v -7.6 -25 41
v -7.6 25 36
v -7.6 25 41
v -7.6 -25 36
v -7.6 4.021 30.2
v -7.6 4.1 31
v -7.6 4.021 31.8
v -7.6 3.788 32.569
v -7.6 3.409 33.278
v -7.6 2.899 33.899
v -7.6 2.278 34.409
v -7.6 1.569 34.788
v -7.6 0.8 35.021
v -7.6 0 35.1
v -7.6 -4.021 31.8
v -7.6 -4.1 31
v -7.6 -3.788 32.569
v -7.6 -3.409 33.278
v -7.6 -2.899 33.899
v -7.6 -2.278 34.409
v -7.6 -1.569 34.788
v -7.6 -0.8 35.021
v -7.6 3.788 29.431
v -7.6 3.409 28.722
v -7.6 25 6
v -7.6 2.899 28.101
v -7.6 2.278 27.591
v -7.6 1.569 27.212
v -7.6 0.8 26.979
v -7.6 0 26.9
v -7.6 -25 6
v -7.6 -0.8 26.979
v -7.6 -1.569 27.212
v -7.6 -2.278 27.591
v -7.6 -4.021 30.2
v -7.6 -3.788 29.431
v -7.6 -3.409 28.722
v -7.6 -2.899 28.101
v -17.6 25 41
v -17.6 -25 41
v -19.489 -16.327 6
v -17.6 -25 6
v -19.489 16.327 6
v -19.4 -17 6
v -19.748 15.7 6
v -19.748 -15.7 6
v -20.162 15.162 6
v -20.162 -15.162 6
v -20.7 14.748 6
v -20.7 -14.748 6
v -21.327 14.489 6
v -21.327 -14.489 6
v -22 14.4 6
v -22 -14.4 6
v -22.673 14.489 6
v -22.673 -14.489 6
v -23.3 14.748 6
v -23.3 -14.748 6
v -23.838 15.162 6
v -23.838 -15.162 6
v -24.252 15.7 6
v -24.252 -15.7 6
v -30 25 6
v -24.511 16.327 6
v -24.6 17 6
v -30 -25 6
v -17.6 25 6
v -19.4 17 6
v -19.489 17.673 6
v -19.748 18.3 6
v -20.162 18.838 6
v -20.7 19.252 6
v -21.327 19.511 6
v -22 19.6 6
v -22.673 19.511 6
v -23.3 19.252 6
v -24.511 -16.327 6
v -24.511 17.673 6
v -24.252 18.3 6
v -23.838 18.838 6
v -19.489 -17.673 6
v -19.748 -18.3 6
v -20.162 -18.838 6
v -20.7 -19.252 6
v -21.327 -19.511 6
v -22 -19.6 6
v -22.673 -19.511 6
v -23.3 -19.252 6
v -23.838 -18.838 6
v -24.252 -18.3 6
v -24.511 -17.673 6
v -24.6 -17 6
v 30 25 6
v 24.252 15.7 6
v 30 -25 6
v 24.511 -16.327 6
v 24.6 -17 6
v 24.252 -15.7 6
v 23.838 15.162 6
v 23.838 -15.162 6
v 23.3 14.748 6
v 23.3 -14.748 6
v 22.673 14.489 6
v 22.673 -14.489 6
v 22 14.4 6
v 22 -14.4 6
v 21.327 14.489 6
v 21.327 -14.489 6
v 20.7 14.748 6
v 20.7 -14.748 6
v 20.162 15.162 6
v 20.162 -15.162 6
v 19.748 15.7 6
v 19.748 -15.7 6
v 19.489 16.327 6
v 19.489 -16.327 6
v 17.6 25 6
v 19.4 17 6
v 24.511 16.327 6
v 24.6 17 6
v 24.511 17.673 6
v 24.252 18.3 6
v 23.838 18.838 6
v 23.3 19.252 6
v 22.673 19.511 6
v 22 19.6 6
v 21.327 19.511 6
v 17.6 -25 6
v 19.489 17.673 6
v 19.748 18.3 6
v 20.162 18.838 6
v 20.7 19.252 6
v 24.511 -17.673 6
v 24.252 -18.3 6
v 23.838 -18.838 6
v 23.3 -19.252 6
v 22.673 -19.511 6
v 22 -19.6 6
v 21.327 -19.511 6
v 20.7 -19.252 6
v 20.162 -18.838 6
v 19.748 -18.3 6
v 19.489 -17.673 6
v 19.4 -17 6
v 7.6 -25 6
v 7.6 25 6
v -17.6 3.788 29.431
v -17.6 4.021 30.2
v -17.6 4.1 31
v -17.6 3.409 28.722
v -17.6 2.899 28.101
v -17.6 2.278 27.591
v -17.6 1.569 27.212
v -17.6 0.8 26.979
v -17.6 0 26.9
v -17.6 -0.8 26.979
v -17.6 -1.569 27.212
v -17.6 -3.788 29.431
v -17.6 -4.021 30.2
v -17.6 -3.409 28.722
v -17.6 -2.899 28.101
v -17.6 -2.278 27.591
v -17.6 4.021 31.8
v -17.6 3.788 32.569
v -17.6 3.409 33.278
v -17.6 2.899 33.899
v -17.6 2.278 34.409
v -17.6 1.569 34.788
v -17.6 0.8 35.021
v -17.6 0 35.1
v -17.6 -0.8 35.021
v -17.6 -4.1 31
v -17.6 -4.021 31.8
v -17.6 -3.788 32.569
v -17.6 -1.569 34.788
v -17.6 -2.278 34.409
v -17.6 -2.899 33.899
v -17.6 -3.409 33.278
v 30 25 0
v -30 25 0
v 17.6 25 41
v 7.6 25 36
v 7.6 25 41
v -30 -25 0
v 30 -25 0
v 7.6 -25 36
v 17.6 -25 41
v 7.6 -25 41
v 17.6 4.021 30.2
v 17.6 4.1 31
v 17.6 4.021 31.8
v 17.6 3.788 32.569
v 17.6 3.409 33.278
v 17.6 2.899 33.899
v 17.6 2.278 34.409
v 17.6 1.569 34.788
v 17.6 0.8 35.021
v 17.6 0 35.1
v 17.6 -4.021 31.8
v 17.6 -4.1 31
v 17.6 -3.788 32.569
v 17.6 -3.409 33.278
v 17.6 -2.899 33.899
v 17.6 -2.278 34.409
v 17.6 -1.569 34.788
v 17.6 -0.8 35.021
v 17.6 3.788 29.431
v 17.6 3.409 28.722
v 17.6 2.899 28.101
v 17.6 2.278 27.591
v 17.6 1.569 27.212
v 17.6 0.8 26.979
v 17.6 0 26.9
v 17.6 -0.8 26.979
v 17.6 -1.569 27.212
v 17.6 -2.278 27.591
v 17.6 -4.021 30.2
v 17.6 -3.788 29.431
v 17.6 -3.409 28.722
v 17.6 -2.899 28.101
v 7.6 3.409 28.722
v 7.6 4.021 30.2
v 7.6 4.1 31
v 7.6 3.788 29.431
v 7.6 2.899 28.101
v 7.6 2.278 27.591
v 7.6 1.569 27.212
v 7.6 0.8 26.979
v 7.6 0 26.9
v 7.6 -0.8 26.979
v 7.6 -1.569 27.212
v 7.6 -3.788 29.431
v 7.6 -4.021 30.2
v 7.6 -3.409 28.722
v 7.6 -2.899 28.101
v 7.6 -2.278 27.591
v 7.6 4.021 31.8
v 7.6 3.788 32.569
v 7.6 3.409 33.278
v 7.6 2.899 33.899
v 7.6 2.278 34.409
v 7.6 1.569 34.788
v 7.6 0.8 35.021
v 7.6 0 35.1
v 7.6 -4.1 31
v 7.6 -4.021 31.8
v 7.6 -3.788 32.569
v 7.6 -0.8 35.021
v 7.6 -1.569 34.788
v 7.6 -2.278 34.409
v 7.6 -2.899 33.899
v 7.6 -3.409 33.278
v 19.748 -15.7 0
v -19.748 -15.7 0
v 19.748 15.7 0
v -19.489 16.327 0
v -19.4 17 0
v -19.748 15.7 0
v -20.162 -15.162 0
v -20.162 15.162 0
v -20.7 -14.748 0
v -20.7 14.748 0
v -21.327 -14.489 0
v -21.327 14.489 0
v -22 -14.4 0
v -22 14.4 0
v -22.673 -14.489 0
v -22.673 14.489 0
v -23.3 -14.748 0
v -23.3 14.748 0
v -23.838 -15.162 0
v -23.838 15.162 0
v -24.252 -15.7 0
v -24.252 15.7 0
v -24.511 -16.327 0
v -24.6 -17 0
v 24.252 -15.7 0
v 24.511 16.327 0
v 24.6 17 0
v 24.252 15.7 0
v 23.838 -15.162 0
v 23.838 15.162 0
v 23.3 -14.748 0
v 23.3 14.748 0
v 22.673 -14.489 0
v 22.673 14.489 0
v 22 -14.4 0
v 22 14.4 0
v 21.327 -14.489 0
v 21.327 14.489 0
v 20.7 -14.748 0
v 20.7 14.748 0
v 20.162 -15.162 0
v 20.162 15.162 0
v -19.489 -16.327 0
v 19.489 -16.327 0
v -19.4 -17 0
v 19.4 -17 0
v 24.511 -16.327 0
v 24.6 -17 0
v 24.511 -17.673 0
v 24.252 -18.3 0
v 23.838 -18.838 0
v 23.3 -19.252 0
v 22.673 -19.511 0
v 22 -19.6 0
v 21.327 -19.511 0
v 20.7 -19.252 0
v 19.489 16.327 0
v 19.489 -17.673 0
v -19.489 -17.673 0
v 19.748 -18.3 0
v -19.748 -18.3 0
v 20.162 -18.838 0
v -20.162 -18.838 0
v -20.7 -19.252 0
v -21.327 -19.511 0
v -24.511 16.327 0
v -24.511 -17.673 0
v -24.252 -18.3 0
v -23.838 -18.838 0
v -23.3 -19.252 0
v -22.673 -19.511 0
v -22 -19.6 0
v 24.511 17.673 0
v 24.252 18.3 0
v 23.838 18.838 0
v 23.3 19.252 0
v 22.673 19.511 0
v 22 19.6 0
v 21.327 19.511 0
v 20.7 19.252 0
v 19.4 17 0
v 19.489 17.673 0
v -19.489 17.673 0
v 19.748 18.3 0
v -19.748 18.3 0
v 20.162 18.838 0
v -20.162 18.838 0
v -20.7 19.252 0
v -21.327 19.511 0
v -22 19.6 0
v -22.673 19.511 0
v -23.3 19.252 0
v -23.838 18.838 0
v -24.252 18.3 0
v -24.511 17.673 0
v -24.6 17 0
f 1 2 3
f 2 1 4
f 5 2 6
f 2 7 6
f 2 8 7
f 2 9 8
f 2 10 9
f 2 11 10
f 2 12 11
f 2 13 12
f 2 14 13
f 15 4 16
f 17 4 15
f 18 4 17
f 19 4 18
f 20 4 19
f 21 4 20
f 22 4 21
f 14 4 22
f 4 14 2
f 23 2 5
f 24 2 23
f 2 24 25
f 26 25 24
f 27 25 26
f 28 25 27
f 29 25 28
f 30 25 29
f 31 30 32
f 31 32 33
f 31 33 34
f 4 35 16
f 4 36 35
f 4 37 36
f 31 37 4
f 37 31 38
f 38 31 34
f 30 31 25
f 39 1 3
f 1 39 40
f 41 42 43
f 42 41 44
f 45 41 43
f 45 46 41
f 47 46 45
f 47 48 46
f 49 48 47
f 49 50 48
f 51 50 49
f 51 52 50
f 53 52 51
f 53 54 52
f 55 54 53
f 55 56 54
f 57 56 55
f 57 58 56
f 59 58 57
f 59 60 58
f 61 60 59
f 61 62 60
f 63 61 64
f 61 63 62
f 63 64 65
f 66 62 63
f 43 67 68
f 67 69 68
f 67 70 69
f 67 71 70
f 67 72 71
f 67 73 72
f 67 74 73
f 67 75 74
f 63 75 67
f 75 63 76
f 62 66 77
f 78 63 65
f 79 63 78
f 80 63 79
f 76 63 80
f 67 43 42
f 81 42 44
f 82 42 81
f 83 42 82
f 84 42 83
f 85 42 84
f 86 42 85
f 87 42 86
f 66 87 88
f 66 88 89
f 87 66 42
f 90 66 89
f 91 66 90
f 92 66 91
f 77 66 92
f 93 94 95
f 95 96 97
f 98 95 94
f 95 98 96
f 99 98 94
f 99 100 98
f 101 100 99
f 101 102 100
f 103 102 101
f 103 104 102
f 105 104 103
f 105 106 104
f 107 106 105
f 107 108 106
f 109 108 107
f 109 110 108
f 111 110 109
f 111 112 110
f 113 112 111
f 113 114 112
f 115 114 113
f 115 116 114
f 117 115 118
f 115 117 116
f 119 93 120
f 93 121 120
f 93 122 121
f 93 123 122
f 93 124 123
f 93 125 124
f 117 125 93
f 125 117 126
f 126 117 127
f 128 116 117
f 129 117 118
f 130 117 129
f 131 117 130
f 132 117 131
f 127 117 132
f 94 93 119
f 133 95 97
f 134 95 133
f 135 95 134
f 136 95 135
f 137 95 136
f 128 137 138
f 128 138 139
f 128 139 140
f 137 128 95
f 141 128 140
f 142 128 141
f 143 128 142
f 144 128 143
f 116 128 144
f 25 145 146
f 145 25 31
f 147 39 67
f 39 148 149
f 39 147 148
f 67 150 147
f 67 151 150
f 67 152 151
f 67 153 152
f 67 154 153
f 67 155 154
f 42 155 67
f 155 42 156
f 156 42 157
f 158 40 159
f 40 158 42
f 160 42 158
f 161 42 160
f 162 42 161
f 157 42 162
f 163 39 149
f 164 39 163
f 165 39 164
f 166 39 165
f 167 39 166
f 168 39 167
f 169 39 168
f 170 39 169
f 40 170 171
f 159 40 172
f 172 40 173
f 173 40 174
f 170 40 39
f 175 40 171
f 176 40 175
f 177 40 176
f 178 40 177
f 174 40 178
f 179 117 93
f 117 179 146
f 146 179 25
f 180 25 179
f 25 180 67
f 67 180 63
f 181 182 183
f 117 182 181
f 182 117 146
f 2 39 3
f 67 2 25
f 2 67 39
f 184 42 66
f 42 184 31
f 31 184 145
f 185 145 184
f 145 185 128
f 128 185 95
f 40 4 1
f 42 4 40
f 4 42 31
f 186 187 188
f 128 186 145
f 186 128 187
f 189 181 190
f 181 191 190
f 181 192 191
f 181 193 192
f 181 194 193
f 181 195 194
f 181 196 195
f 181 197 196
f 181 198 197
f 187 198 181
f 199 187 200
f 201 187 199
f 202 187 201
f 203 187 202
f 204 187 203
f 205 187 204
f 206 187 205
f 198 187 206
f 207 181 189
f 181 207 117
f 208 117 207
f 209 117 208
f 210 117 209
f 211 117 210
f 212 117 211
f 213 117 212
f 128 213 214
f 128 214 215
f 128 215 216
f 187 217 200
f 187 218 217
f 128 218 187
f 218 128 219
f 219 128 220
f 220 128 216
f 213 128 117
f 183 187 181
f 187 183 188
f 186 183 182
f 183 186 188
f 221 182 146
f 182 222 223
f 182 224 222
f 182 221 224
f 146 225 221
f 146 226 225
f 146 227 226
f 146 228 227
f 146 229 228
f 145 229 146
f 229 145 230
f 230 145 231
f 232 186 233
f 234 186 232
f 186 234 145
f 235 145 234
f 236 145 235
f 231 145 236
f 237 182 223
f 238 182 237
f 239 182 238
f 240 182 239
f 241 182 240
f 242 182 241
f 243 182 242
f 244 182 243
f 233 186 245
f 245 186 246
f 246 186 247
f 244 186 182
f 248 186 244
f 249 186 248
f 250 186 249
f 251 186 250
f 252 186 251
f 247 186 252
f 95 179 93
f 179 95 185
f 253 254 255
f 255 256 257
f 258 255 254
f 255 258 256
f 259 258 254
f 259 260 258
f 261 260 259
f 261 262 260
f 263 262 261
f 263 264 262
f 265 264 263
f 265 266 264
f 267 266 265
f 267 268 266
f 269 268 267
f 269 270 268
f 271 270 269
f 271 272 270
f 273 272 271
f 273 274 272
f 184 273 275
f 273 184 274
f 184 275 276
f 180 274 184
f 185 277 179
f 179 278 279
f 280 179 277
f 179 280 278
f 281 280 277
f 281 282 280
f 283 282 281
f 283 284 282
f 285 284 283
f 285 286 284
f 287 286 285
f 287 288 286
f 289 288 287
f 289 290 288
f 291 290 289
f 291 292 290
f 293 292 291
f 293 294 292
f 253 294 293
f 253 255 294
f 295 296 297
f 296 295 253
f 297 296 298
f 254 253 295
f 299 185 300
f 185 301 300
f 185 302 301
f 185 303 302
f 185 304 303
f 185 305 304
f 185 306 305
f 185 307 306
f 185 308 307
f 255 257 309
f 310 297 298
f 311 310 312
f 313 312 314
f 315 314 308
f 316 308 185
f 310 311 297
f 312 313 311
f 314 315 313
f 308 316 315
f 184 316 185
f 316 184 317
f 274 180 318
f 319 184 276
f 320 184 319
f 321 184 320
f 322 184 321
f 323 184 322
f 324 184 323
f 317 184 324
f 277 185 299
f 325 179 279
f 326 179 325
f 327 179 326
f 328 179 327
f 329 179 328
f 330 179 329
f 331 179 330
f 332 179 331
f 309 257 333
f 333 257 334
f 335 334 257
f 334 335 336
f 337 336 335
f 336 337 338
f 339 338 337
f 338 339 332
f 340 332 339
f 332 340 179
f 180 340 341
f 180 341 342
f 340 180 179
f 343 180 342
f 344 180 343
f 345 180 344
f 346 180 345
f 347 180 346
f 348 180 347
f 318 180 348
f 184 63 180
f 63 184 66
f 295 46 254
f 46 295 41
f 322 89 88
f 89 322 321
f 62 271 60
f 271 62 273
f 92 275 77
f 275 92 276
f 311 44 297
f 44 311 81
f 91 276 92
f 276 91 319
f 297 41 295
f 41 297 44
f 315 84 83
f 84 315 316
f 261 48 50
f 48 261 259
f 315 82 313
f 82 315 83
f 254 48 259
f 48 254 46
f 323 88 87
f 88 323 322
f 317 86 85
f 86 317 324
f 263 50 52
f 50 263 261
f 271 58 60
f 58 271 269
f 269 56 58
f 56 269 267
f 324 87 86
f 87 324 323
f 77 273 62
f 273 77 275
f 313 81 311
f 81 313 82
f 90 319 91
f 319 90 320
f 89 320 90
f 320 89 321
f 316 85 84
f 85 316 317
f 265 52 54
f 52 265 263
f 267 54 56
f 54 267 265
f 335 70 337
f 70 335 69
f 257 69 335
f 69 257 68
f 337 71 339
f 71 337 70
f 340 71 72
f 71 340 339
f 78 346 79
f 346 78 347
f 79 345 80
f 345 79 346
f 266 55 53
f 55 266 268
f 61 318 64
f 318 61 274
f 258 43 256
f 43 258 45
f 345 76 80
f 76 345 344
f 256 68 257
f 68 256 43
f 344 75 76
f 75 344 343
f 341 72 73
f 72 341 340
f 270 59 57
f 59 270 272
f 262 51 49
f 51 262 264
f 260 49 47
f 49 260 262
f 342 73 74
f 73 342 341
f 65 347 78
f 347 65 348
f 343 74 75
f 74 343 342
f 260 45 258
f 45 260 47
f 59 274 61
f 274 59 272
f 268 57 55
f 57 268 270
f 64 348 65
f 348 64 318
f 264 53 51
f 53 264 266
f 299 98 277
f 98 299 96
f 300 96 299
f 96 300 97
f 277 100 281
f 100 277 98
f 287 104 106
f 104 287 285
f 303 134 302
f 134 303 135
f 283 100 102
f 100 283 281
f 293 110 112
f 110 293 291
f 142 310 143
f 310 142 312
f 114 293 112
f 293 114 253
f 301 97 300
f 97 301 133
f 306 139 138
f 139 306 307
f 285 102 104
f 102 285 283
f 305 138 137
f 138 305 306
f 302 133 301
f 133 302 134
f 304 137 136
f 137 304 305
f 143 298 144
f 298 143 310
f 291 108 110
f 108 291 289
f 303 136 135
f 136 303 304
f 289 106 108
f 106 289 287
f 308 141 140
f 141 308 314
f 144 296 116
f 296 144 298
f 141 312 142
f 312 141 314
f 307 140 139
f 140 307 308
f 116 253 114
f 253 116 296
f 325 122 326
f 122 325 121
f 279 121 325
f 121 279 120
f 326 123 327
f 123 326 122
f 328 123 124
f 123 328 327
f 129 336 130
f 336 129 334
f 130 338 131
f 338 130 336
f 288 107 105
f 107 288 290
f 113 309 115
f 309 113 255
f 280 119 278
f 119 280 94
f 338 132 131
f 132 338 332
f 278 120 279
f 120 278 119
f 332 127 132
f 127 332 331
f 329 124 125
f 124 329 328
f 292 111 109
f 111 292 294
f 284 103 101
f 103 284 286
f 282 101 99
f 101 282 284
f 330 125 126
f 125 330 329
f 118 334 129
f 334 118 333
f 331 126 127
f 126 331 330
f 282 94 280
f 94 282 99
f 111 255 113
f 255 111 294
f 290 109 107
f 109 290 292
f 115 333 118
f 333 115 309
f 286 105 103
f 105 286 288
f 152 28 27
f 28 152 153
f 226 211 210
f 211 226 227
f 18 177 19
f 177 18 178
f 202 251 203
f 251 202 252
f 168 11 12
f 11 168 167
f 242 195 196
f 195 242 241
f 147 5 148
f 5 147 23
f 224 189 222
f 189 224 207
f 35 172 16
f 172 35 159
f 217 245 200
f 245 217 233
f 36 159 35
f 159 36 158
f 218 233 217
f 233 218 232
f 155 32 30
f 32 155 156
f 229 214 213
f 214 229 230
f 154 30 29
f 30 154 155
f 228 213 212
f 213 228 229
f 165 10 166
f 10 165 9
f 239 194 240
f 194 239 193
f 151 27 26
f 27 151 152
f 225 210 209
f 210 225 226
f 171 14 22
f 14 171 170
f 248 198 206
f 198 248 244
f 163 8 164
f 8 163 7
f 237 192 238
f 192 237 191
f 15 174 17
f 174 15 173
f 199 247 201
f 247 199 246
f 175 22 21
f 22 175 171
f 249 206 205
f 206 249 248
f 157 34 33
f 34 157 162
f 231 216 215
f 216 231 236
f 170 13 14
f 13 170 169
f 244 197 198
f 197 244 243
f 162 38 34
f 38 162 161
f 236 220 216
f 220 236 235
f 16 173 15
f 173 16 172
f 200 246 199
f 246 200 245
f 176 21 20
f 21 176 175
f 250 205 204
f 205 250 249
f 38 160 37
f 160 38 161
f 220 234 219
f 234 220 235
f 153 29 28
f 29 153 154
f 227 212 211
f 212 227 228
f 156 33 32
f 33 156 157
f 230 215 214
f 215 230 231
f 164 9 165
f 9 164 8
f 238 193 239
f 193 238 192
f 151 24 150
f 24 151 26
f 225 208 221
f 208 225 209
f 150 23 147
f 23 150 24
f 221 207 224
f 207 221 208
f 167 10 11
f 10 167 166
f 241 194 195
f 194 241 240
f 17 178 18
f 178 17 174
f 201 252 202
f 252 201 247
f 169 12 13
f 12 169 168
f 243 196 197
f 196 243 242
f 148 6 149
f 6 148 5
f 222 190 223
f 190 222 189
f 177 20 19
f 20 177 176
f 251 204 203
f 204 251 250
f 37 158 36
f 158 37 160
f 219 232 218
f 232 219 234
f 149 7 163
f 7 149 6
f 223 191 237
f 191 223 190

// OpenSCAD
// PROJECT: 5kg Vertical Panel Actuator
// PART: Twin-Lug Panel Bracket (Matching 14.8mm Bearing Glove)
// REQ: 15.2mm Gap + M8 Pivot + 4x Mounting Holes

base_w = 60;
base_h = 50;
base_t = 6;
lug_gap = 15.2; // Clearance for the 14.8mm bearing glove
lug_thick = 10;
lug_height = 35; // Height from base to pivot center
pivot_dia = 8.2;

module panel_bracket() {
    difference() {
        union() {
            // Main Base Plate
            translate([-base_w/2, -base_h/2, 0])
                cube([base_w, base_h, base_t]);
            
            // The Twin Lugs
            for(side = [-1, 1]) {
                translate([(side * (lug_gap/2 + lug_thick/2)) - lug_thick/2, -base_h/2, base_t])
                    cube([lug_thick, base_h, lug_height]);
            }
        }

        // M8 PIVOT HOLE (Through both lugs)
        translate([-base_w/2 - 5, 0, base_t + lug_height - 10])
            rotate([0, 90, 0])
                cylinder(d=pivot_dia, h=base_w + 10, $fn=32);

        // MOUNTING SCREW HOLES (4x 5.2mm for Wood Screws)
        for(x = [-1, 1]) {
            for(y = [-1, 1]) {
                translate([x * (base_w/2 - 8), y * (base_h/2 - 8), -1])
                    cylinder(d=5.2, h=base_t + 2, $fn=24);
            }
        }
        
        // Relief Cut for Arm Swing (Ensures the glove doesn't hit the base at 65°)
        translate([-lug_gap/2, -base_h/2 - 1, base_t])
            cube([lug_gap, base_h + 2, lug_height - 5]);
    }
}

panel_bracket();
